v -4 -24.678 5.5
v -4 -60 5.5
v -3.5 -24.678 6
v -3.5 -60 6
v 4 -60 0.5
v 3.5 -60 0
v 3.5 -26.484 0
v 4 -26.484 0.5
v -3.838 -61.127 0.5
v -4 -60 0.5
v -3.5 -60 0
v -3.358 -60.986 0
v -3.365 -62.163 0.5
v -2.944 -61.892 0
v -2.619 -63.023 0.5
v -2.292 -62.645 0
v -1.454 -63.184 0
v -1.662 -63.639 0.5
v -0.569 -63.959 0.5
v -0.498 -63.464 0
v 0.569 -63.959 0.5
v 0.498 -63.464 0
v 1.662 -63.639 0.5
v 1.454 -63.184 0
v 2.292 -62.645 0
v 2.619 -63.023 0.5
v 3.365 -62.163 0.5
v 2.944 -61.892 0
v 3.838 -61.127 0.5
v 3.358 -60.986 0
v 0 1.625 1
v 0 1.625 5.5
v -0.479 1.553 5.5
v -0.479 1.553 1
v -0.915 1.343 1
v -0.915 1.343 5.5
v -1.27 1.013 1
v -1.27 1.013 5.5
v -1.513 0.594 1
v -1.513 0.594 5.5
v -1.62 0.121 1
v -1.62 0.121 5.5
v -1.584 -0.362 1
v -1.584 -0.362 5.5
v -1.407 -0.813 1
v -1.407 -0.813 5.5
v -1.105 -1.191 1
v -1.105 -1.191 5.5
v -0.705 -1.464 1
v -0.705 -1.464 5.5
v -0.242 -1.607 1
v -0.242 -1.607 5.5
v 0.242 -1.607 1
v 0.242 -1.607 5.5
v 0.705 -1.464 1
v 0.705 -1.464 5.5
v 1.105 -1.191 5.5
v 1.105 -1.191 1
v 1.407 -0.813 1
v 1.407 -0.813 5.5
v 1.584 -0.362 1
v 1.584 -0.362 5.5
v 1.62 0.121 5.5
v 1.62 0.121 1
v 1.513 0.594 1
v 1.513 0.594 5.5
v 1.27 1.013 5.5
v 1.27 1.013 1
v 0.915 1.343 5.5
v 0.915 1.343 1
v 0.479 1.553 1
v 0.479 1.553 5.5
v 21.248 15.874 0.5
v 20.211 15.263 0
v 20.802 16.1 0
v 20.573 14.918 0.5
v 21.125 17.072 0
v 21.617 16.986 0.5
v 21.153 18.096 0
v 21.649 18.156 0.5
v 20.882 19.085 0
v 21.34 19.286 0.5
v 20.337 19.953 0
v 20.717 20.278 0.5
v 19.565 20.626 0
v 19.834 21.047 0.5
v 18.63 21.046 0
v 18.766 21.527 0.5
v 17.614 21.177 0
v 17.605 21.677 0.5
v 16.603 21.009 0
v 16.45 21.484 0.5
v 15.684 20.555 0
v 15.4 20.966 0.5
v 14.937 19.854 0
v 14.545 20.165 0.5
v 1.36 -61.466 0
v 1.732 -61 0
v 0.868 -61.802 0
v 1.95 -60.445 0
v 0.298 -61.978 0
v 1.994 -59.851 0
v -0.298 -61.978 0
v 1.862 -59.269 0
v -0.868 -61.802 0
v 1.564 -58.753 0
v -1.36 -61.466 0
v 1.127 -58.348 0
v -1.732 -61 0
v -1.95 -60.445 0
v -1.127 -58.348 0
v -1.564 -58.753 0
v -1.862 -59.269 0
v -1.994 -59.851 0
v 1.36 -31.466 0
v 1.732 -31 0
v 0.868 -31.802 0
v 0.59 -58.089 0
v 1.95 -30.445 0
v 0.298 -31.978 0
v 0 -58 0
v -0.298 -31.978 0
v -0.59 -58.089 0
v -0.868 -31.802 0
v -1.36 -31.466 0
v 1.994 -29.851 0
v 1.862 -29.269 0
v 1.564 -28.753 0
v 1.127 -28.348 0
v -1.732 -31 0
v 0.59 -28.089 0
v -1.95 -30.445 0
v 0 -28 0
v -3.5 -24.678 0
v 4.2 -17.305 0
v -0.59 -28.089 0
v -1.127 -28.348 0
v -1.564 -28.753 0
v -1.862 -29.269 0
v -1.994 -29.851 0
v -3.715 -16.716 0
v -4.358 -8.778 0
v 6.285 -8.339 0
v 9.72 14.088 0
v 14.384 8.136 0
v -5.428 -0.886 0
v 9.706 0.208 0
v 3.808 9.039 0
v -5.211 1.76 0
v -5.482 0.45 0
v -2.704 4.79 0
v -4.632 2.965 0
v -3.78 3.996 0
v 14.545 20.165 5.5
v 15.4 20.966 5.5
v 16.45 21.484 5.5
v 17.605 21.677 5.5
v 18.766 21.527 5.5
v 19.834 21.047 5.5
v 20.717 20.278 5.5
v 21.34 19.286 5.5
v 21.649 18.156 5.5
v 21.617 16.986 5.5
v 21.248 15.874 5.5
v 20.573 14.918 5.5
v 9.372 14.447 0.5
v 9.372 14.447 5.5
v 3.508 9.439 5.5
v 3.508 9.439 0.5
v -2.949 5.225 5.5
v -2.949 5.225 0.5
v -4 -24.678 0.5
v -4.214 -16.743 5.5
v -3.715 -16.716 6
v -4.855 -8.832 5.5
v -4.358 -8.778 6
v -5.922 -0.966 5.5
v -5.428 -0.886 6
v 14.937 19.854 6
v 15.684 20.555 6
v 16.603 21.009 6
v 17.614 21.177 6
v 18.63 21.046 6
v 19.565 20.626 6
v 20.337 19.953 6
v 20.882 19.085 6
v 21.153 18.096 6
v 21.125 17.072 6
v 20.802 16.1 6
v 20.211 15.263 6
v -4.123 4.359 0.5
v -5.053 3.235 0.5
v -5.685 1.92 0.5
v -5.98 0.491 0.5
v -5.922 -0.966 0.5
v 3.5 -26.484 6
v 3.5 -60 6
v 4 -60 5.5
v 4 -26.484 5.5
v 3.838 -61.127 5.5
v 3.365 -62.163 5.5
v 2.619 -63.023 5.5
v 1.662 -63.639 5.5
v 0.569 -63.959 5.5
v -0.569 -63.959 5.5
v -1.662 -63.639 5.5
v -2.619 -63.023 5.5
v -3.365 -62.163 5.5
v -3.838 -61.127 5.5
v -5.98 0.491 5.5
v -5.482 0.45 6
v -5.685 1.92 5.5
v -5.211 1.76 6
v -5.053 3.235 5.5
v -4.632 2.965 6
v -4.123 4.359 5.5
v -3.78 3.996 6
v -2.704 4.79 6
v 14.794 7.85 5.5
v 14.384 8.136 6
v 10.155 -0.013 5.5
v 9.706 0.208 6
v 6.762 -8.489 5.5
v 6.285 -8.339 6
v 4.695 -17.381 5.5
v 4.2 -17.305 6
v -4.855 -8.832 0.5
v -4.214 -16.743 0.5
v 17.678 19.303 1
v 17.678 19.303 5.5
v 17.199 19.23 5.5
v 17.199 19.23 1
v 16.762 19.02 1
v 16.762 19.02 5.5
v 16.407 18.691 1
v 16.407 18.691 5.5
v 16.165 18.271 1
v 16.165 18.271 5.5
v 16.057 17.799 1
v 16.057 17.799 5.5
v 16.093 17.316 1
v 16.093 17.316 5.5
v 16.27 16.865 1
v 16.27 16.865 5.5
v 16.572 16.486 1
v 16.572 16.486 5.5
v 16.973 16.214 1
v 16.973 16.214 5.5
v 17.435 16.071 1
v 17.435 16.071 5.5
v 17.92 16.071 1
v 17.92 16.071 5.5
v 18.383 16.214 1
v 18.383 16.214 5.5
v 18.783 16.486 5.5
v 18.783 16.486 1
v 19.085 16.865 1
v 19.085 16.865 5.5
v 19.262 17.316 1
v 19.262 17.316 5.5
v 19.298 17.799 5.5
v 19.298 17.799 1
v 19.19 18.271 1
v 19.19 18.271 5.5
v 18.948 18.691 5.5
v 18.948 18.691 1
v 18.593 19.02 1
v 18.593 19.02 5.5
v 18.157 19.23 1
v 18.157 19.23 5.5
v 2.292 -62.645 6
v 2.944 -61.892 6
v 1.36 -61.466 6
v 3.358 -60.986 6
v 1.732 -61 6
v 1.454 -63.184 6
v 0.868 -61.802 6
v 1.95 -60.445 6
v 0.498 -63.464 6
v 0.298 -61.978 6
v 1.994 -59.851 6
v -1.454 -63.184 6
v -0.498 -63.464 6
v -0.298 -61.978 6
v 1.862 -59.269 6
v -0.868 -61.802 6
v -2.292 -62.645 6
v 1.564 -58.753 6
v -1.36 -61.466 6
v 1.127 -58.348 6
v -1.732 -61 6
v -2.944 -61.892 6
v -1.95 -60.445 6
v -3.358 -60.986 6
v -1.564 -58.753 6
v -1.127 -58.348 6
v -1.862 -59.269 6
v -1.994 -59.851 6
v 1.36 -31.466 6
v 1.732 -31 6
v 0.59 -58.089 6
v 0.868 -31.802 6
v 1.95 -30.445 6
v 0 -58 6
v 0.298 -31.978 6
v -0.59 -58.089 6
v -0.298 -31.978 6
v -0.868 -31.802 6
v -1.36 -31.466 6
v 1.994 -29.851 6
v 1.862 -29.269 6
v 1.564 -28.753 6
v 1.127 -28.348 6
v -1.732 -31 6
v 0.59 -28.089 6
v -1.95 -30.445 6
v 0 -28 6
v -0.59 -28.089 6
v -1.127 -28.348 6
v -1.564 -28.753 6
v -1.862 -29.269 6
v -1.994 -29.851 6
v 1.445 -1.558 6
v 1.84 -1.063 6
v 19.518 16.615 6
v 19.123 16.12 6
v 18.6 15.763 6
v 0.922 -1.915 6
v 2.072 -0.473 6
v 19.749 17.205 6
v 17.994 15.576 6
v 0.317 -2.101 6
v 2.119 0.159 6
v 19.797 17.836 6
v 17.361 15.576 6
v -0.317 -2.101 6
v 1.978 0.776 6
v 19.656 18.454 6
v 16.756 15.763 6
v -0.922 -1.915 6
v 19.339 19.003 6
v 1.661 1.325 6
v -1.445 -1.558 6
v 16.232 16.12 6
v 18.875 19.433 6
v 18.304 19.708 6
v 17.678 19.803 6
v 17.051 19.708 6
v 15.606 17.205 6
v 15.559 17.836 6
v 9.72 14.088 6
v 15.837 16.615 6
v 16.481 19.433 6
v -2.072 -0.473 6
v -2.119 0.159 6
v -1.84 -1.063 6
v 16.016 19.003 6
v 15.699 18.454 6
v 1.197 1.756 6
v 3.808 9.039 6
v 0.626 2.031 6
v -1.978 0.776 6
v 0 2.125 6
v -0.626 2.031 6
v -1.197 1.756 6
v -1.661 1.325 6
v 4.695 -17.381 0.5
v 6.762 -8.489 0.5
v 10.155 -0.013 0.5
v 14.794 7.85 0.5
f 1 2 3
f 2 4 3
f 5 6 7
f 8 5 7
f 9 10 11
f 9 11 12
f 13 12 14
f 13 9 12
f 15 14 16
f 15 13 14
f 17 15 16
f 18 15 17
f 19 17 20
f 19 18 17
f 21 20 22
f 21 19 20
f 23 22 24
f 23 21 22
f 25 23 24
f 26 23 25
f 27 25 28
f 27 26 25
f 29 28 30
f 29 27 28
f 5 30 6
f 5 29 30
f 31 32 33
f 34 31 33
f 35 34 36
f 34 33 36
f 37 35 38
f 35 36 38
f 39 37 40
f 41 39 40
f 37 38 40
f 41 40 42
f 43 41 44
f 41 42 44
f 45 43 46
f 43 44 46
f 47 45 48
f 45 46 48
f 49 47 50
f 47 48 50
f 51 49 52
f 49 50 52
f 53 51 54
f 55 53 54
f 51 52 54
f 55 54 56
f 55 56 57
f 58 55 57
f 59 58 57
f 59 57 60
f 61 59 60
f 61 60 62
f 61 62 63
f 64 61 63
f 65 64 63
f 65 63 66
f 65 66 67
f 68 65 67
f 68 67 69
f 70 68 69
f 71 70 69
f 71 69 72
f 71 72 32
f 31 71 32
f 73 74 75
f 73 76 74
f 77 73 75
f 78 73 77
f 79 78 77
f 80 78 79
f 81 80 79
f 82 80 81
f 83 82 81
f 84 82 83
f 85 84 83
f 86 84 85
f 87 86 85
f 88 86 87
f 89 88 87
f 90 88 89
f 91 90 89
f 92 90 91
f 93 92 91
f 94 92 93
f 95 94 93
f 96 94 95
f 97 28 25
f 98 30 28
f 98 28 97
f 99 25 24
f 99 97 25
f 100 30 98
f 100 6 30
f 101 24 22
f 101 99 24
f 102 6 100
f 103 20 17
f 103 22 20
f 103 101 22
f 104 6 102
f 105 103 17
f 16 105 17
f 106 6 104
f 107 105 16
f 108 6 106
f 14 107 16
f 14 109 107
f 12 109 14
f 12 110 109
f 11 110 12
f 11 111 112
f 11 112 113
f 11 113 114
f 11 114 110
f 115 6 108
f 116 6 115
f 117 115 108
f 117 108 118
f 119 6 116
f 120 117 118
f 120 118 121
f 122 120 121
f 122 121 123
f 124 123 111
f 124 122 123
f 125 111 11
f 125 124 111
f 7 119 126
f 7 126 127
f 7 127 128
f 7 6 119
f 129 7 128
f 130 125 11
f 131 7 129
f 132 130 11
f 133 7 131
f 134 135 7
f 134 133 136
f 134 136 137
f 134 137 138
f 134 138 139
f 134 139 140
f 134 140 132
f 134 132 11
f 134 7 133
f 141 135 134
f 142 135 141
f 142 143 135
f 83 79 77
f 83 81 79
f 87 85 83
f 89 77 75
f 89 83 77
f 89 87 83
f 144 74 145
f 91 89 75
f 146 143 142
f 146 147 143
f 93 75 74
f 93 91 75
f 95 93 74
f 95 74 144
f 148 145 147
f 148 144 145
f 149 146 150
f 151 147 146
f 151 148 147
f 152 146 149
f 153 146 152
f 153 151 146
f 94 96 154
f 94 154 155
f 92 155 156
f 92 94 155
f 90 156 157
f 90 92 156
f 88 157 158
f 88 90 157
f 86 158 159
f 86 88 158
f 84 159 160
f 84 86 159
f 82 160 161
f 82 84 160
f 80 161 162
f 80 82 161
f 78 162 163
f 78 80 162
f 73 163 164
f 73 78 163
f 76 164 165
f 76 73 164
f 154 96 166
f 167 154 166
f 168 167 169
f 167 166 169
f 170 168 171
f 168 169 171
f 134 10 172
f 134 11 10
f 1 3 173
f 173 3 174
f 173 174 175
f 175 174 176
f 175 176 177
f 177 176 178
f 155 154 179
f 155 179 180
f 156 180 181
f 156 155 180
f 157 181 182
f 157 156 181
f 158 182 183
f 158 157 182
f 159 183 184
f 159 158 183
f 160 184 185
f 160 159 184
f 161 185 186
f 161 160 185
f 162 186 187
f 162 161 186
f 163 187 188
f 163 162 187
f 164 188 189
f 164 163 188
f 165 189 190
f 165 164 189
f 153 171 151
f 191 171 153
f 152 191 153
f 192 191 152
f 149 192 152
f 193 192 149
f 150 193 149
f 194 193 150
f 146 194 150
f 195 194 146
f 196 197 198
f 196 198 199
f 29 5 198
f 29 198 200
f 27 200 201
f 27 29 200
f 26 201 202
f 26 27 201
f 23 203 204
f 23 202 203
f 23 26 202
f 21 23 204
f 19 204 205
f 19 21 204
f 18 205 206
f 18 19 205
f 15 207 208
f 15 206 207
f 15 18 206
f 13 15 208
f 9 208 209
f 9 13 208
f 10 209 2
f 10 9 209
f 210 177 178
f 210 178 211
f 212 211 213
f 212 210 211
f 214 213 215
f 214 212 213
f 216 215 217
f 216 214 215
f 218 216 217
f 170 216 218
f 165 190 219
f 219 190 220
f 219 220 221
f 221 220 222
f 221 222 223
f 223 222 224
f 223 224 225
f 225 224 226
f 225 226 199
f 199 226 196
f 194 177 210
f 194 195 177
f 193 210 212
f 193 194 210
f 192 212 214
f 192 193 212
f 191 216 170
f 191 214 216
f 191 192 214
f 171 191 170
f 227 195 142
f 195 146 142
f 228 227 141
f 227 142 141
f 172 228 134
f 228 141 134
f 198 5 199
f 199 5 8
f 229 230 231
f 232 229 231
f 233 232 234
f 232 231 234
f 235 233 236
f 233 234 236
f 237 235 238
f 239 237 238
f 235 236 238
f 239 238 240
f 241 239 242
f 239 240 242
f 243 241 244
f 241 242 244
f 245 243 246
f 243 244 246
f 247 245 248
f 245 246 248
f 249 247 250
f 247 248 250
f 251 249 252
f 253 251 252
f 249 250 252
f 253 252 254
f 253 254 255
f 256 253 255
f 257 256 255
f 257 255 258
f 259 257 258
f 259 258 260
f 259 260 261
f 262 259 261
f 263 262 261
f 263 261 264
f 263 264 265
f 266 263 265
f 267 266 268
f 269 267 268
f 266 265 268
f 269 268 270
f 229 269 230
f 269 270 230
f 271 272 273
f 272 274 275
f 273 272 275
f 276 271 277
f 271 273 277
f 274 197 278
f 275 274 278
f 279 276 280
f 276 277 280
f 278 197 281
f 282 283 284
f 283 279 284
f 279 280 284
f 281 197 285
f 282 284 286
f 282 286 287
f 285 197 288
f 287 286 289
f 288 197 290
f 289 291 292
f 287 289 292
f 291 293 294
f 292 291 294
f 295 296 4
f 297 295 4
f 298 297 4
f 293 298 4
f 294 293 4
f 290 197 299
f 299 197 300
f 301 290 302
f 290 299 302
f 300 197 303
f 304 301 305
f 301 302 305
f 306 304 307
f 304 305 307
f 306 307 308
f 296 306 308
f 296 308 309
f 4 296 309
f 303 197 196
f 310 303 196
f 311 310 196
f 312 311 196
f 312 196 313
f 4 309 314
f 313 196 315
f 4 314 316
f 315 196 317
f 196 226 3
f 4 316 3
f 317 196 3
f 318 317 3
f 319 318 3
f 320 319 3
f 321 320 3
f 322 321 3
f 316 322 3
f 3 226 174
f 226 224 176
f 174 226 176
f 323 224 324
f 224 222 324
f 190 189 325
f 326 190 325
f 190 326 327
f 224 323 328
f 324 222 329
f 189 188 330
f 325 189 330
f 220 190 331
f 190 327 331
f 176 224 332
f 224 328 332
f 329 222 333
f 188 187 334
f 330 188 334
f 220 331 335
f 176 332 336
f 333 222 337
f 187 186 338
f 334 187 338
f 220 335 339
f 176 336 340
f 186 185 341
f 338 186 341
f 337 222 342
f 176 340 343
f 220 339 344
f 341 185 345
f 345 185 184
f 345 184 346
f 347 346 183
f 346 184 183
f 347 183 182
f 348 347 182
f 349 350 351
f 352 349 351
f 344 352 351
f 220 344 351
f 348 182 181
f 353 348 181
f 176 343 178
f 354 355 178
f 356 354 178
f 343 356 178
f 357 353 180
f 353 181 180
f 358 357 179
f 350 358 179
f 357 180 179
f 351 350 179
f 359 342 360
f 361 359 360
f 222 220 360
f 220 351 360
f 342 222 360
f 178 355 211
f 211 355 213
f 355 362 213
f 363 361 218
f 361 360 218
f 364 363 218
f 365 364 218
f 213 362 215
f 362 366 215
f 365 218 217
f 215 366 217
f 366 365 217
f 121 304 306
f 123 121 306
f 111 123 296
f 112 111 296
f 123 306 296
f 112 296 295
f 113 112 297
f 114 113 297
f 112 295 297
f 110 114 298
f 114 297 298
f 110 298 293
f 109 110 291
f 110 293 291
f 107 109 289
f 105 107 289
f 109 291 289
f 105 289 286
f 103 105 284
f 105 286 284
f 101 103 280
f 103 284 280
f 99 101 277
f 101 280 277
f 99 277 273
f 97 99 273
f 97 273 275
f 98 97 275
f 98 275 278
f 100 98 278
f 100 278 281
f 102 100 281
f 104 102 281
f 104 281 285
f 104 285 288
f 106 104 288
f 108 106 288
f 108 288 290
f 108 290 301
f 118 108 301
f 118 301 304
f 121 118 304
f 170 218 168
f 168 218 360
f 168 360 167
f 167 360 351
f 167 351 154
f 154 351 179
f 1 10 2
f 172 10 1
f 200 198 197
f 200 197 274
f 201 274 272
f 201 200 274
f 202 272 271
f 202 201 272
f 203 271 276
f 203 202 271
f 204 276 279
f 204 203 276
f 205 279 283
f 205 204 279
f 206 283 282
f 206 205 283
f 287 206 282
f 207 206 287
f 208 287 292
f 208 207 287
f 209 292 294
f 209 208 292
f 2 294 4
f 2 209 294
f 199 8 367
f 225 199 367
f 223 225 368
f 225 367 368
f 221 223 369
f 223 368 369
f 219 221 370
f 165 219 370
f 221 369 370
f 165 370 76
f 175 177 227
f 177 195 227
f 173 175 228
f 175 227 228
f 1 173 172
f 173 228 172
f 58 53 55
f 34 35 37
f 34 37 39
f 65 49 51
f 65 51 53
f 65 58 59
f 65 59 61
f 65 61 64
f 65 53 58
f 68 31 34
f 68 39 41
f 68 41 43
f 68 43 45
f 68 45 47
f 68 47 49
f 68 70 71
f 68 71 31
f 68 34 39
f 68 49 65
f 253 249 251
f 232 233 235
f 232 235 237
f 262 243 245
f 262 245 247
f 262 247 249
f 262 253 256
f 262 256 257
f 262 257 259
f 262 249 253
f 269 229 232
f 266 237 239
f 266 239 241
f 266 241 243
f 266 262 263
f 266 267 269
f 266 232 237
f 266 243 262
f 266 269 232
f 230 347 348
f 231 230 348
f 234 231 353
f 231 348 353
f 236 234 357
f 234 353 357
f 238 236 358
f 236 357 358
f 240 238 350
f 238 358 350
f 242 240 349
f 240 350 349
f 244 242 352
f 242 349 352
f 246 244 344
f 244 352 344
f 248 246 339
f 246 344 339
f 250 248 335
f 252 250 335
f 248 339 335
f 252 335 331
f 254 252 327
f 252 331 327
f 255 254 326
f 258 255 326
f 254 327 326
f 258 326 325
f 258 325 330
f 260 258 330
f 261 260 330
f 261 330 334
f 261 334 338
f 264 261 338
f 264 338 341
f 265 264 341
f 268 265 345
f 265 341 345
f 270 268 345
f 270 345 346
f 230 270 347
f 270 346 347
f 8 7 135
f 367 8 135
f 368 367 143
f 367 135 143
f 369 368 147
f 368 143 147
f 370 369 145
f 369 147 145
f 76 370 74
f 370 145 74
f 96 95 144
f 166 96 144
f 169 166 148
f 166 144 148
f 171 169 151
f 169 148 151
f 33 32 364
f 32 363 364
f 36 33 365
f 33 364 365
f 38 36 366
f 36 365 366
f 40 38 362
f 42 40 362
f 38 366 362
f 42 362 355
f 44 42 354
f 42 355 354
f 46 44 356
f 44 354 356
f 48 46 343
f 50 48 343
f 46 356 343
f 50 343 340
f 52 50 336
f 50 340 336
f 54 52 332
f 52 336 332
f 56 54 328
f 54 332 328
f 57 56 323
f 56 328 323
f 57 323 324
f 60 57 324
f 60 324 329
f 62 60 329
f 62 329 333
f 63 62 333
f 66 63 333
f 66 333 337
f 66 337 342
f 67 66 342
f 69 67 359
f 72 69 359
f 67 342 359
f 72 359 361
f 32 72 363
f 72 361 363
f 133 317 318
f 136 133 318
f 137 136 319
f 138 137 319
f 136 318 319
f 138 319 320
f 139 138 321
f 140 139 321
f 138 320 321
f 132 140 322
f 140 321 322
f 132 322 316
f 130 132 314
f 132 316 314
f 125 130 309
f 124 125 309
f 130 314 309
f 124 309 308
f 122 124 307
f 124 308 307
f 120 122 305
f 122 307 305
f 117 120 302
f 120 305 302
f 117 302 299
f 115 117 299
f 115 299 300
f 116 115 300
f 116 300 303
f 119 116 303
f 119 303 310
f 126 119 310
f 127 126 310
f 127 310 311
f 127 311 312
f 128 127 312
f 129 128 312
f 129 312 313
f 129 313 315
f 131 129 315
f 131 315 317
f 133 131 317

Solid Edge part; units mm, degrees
sketch "Sketch1" plane through (0, 0, 0) normal (0, 0, 1) x (1, 0, 0)
  arc A0 (20.5728, 14.9176) -> (4, -26.4839) centre (64, -26.4839) ccw
  line L0 (4, -60) -> (4, -26.4839)
  line L1 (-4, -60) -> (-4, -24.6779)
  arc A1 (-4, -24.6779) -> (-5.9217, -0.9662) centre (-151.25, -24.6779) ccw
  arc A2 (14.5451, 20.165) -> (-2.9494, 5.225) centre (-32.4437, 57.4753) cw
  arc A3 (4, -60) -> (-4, -60) centre (0, -60) cw
  arc A4 (-5.9217, -0.9662) -> (-2.9494, 5.225) centre (0, 0) cw
  arc A5 (14.5451, 20.165) -> (20.5728, 14.9176) centre (17.6777, 17.6777) cw
extrude "Protrusion1" add sketch "Sketch1" along normal blind 6
sketch "Sketch2" plane through (7.8388, -21.1612, 6) normal (0, 0, 1) x (0, 1, 0)
  circle A0 centre (21.1612, 7.8388) radius 1.625
  circle A1 centre (38.8388, -9.8388) radius 1.625
  dimension "D1" = 3.25
  dimension "D2" = 3.25
extrude "VaciadoExtruido_1" cut sketch "Sketch2" against normal blind 5
sketch "Sketch3" plane through (7.8388, -21.1612, 6) normal (0, 0, 1) x (0, 1, 0)
  circle A0 centre (-38.8388, 7.8388) radius 2
  circle A1 centre (-8.8388, 7.8388) radius 2
  dimension "D1" = 4
  dimension "D2" = 4
  dimension "D3" = 30
extrude "Cutout1" cut sketch "Sketch3" against normal through all
chamfer "Chaflán_1" distance 0.5 angle 45 18 edges at (4, -43.2419, 6) (0, -64, 6) (-4, -42.339, 6) (-4.4812, -12.7832, 6) (-5.409, 2.5967, 6) (6.5206, 11.8487, 6) (20.3041, 20.6946, 6) (8.2971, -4.1862, 6) (4, -43.2419, 0) (0, -64, 0) (-4, -42.339, 0) (-4.4812, -12.7832, 0) (-5.409, 2.5967, 0) (6.5206, 11.8487, 0) (20.3041, 20.6946, 0) (8.2971, -4.1862, 0) (0, -1.625, 6) (17.6777, 16.0527, 6)
